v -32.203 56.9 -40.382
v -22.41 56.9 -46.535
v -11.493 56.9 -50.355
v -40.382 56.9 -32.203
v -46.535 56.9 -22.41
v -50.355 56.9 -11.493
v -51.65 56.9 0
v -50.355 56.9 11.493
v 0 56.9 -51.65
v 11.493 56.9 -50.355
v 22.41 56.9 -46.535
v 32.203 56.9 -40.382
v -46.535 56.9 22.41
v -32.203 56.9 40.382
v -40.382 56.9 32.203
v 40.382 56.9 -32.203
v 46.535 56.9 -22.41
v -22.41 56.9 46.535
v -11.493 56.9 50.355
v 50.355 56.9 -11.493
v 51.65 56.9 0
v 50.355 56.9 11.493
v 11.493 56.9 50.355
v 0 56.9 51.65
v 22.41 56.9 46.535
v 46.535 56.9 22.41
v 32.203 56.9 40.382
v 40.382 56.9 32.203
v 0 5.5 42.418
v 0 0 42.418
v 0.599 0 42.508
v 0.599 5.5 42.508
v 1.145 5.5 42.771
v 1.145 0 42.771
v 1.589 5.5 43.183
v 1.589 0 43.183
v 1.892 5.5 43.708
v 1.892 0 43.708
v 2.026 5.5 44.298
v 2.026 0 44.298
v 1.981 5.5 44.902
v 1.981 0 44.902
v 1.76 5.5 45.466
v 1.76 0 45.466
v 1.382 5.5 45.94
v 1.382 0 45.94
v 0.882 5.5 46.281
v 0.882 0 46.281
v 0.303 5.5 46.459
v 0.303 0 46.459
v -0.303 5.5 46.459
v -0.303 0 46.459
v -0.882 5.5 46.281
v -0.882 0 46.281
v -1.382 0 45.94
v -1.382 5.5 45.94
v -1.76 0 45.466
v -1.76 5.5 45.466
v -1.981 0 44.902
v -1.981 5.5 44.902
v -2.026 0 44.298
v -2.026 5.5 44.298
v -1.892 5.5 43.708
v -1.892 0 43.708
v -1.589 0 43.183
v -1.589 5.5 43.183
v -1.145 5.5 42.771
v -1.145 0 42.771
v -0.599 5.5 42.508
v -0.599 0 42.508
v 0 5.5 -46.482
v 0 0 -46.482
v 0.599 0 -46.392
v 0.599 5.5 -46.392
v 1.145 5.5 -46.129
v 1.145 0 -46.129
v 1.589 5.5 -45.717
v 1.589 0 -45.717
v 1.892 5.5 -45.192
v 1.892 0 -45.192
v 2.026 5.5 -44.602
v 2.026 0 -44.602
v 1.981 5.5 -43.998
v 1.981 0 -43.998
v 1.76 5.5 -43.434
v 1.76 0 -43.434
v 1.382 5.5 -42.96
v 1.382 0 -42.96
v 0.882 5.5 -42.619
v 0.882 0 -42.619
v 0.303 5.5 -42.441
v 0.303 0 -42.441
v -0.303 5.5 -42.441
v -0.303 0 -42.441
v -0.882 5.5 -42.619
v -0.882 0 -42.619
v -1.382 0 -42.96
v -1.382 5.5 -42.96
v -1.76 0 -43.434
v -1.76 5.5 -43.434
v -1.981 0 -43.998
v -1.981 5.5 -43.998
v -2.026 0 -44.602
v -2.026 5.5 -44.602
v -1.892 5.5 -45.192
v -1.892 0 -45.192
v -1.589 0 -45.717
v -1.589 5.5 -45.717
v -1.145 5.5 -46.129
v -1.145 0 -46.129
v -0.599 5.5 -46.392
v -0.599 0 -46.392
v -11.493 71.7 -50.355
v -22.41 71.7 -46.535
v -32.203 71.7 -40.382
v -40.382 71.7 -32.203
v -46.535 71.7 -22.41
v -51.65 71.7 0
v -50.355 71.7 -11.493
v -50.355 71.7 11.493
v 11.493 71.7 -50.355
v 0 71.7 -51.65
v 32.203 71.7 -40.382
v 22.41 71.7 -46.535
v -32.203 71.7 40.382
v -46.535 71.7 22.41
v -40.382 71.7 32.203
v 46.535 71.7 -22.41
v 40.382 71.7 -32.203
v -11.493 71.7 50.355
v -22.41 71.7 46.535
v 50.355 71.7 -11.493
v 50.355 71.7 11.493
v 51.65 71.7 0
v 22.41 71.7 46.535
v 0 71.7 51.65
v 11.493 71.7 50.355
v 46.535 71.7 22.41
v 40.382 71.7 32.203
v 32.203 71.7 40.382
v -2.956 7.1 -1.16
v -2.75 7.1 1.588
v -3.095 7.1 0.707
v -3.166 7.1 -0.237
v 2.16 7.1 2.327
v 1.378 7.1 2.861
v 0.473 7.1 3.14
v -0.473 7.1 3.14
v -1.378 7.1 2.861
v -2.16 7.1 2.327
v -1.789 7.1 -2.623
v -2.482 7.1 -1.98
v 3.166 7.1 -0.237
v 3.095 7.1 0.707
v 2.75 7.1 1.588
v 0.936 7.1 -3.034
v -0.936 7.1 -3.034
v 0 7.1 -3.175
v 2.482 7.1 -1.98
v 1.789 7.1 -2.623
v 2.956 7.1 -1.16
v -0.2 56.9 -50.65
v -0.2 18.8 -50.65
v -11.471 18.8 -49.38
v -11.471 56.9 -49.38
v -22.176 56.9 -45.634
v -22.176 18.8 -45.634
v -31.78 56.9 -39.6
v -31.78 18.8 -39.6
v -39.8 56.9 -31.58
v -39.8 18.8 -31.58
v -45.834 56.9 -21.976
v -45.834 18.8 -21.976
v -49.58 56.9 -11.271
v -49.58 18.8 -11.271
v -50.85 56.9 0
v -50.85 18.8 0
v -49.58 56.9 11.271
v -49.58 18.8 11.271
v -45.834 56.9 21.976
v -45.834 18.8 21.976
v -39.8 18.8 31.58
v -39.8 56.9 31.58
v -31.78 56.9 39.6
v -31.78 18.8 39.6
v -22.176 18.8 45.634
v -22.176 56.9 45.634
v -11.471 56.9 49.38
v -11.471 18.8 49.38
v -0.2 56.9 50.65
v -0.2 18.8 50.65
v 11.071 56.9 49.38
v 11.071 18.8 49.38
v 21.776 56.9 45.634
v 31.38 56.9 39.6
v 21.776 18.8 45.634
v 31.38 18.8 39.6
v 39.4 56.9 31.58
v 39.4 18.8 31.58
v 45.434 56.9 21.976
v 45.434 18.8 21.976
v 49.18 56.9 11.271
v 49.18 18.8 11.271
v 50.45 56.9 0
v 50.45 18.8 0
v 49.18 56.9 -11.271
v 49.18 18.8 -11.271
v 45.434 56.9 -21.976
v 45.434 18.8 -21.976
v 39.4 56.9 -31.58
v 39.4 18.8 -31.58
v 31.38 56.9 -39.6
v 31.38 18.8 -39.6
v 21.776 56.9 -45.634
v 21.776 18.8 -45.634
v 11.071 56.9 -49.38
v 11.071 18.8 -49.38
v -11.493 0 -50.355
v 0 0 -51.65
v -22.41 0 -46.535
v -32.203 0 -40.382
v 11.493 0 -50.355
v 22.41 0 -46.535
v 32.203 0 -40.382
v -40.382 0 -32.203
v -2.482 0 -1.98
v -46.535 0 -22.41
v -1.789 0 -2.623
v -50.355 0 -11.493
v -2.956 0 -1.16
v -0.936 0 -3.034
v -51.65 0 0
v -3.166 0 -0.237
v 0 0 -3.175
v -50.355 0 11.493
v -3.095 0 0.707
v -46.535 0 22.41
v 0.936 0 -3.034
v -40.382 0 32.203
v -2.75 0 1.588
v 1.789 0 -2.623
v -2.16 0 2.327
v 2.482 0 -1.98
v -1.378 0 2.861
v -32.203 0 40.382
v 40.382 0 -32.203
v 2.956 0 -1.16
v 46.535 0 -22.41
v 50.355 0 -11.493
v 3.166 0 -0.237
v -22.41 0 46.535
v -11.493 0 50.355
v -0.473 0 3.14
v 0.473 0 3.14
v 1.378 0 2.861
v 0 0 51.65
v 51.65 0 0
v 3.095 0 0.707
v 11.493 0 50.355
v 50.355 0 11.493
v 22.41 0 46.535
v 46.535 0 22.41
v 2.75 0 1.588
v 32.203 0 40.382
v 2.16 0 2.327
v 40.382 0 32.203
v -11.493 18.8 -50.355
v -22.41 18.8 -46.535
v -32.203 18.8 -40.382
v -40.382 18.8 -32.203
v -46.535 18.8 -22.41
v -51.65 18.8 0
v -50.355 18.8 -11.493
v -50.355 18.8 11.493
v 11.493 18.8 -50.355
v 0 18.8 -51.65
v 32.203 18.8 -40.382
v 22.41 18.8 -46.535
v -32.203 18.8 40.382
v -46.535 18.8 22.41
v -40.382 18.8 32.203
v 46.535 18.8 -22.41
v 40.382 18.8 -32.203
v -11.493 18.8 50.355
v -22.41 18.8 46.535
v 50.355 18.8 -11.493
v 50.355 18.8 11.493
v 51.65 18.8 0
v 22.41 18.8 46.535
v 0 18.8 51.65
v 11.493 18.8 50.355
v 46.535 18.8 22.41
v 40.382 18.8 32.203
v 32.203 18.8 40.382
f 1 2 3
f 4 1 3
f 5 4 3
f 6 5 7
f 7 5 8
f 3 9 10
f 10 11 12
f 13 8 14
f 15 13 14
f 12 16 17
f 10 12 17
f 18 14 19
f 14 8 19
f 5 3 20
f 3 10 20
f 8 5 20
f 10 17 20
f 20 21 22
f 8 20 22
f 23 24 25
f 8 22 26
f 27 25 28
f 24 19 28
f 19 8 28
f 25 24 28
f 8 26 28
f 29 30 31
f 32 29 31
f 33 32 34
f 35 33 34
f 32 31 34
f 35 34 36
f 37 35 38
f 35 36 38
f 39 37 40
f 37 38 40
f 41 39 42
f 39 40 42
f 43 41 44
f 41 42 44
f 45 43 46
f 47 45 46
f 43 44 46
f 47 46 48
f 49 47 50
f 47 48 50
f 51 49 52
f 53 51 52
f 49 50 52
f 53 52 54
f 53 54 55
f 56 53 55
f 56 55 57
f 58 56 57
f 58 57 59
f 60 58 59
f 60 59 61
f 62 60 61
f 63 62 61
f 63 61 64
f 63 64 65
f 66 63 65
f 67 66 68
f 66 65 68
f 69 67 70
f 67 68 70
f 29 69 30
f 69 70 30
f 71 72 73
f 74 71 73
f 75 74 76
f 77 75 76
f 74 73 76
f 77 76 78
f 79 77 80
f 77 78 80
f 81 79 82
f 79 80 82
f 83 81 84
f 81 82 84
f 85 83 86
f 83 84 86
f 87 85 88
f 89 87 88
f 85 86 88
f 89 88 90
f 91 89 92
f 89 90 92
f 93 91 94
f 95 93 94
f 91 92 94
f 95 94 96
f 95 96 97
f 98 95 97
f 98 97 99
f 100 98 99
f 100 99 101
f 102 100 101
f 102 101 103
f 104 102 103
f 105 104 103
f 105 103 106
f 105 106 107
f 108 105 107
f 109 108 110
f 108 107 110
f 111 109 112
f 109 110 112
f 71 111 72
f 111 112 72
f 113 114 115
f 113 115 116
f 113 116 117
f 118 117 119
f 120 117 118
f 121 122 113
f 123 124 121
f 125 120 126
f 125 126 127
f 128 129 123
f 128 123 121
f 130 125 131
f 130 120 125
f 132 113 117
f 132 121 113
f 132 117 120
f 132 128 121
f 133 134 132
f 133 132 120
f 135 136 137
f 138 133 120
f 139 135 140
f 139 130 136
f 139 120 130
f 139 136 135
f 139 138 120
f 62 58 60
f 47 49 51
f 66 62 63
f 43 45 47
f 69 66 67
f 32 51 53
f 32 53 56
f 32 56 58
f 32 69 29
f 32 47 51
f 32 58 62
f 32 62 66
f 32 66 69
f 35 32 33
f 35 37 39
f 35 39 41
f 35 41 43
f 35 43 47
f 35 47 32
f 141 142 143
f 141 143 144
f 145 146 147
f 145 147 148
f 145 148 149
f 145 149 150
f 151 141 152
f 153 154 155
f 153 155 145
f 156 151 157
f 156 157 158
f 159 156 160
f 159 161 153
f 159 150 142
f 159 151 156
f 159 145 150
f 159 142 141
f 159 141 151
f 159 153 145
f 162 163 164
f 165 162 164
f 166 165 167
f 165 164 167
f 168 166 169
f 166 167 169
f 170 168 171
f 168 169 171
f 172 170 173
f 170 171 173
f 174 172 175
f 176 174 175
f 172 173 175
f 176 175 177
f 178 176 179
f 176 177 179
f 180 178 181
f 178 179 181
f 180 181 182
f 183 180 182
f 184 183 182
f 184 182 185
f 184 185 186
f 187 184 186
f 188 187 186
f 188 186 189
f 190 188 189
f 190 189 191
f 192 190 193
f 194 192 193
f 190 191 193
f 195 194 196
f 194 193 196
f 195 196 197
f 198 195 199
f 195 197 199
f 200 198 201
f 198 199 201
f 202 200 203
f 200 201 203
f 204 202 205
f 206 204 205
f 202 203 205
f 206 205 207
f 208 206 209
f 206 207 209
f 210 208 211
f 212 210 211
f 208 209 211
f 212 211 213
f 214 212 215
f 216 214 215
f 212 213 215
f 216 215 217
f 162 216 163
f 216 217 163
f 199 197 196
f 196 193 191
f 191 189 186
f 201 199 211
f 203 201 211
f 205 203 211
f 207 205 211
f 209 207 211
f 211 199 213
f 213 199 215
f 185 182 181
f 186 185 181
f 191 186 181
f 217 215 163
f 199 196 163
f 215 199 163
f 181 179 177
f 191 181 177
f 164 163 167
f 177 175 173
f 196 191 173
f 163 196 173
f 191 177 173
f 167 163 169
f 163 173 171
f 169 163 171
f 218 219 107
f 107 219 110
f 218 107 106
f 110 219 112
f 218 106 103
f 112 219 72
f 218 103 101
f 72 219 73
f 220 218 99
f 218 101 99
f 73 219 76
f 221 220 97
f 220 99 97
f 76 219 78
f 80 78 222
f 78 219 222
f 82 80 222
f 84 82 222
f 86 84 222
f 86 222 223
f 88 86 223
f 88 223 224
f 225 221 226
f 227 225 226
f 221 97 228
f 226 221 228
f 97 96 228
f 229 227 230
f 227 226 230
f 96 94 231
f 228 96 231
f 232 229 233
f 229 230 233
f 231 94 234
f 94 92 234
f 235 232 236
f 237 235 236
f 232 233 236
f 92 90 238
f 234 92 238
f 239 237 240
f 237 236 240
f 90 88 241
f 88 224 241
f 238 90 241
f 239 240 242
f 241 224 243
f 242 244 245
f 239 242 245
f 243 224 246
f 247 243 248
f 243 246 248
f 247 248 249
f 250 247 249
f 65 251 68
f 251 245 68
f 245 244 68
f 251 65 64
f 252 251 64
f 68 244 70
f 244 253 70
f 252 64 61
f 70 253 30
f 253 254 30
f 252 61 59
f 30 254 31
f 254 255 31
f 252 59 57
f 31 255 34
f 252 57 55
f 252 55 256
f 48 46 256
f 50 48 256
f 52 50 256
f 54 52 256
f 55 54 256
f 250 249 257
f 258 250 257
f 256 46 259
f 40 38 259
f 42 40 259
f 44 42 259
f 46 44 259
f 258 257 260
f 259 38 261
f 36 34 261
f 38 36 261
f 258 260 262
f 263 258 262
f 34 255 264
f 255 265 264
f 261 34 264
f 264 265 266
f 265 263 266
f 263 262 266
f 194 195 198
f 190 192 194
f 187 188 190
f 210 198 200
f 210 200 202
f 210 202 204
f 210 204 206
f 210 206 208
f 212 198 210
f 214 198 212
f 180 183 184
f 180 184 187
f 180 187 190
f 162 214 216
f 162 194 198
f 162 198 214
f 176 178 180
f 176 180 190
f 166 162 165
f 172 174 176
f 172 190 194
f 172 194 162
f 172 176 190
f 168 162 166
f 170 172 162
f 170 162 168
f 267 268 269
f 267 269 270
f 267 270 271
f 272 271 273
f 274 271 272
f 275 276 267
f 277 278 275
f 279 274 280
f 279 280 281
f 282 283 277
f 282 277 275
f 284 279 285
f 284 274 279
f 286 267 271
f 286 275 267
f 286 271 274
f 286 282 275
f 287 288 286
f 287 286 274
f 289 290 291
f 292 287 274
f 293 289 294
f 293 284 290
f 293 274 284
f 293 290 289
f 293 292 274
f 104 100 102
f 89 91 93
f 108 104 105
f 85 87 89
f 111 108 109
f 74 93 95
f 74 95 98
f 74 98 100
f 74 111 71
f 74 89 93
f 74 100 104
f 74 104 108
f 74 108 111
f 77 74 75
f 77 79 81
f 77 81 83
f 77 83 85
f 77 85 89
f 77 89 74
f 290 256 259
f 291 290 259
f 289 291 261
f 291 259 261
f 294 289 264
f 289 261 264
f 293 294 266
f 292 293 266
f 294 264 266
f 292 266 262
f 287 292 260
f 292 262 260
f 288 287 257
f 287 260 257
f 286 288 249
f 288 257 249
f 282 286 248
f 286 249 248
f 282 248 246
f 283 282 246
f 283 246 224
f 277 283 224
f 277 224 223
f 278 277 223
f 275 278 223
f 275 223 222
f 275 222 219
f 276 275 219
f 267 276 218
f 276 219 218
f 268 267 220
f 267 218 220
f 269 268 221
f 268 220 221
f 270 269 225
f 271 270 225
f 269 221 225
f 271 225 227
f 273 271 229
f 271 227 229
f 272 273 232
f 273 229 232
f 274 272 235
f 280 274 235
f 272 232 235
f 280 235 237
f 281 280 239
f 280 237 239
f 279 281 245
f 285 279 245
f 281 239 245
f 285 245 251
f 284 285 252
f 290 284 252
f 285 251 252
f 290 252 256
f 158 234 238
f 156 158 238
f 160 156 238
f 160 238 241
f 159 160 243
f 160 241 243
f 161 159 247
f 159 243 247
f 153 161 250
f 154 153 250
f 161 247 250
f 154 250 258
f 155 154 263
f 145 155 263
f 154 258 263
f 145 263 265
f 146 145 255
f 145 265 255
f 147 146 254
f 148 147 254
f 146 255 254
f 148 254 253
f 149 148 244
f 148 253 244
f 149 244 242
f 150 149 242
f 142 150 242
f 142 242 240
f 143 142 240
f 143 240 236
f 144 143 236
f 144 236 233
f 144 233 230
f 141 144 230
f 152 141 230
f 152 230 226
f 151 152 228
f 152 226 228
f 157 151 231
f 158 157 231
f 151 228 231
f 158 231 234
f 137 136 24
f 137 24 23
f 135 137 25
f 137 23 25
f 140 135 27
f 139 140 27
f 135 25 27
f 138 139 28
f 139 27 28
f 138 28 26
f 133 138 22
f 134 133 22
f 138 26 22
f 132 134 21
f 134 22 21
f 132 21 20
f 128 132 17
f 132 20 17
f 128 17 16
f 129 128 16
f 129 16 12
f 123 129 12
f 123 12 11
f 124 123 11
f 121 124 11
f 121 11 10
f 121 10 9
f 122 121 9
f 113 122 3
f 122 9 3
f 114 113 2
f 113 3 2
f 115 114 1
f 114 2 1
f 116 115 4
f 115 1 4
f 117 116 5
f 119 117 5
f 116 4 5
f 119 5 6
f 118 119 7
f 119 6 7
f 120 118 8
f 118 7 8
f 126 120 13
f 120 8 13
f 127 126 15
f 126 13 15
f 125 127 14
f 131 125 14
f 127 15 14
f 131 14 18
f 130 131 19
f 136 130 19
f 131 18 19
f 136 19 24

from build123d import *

# Parameters (mm, degrees)
SKETCH1_R           = 51.65
BOSS_EXTRUDE1_DEPTH = 18.8
SKETCH2_R           = 50.65
BOSS_EXTRUDE2_DEPTH = 38.1
SKETCH3_R           = 51.65
BOSS_EXTRUDE3_DEPTH = 14.8
SKETCH5_R           = 2.032
CUT_EXTRUDE1_DEPTH  = 5.5
SKETCH6_R           = 3.175
CUT_EXTRUDE2_DEPTH  = 7.1


with BuildPart() as part:
    # Sketch1 → Boss-Extrude1 (new body)
    with BuildSketch(Plane(origin=(0, 0, 0), x_dir=(1, 0, 0), z_dir=(0, 1, 0))):
        with Locations(Location((0, 0, 0), (0, 0, 270))):
            Circle(SKETCH1_R)
    extrude(amount=BOSS_EXTRUDE1_DEPTH)

    # Sketch5 → Cut-Extrude1 (cut)
    with BuildSketch(Plane.XZ):
        with Locations(Location((0, -44.45, 0), (0, 0, 270))):
            Circle(SKETCH5_R)
        with Locations(Location((0, 44.45, 0), (0, 0, 270))):
            Circle(SKETCH5_R)
    extrude(amount=-CUT_EXTRUDE1_DEPTH, mode=Mode.SUBTRACT)

    # Sketch6 → Cut-Extrude2 (cut)
    with BuildSketch(Plane.XZ):
        with Locations(Location((0, 0, 0), (0, 0, 270))):
            Circle(SKETCH6_R)
    extrude(amount=-CUT_EXTRUDE2_DEPTH, mode=Mode.SUBTRACT)


with BuildPart() as body_2:
    # Sketch2 → Boss-Extrude2 (new body)
    with BuildSketch(Plane(origin=(0, 18.8, 0), x_dir=(1, 0, 0), z_dir=(0, 1, 0))):
        with Locations(Location((-0.2, 0, 0), (0, 0, 90))):
            Circle(SKETCH2_R)
    extrude(amount=BOSS_EXTRUDE2_DEPTH)


with BuildPart() as body_3:
    # Sketch3 → Boss-Extrude3 (new body)
    with BuildSketch(Plane(origin=(0, 56.9, 0), x_dir=(1, 0, 0), z_dir=(0, 1, 0))):
        with Locations(Location((0, 0, 0), (0, 0, 270))):
            Circle(SKETCH3_R)
    extrude(amount=BOSS_EXTRUDE3_DEPTH)


solid = Compound([part.part, body_2.part, body_3.part])
